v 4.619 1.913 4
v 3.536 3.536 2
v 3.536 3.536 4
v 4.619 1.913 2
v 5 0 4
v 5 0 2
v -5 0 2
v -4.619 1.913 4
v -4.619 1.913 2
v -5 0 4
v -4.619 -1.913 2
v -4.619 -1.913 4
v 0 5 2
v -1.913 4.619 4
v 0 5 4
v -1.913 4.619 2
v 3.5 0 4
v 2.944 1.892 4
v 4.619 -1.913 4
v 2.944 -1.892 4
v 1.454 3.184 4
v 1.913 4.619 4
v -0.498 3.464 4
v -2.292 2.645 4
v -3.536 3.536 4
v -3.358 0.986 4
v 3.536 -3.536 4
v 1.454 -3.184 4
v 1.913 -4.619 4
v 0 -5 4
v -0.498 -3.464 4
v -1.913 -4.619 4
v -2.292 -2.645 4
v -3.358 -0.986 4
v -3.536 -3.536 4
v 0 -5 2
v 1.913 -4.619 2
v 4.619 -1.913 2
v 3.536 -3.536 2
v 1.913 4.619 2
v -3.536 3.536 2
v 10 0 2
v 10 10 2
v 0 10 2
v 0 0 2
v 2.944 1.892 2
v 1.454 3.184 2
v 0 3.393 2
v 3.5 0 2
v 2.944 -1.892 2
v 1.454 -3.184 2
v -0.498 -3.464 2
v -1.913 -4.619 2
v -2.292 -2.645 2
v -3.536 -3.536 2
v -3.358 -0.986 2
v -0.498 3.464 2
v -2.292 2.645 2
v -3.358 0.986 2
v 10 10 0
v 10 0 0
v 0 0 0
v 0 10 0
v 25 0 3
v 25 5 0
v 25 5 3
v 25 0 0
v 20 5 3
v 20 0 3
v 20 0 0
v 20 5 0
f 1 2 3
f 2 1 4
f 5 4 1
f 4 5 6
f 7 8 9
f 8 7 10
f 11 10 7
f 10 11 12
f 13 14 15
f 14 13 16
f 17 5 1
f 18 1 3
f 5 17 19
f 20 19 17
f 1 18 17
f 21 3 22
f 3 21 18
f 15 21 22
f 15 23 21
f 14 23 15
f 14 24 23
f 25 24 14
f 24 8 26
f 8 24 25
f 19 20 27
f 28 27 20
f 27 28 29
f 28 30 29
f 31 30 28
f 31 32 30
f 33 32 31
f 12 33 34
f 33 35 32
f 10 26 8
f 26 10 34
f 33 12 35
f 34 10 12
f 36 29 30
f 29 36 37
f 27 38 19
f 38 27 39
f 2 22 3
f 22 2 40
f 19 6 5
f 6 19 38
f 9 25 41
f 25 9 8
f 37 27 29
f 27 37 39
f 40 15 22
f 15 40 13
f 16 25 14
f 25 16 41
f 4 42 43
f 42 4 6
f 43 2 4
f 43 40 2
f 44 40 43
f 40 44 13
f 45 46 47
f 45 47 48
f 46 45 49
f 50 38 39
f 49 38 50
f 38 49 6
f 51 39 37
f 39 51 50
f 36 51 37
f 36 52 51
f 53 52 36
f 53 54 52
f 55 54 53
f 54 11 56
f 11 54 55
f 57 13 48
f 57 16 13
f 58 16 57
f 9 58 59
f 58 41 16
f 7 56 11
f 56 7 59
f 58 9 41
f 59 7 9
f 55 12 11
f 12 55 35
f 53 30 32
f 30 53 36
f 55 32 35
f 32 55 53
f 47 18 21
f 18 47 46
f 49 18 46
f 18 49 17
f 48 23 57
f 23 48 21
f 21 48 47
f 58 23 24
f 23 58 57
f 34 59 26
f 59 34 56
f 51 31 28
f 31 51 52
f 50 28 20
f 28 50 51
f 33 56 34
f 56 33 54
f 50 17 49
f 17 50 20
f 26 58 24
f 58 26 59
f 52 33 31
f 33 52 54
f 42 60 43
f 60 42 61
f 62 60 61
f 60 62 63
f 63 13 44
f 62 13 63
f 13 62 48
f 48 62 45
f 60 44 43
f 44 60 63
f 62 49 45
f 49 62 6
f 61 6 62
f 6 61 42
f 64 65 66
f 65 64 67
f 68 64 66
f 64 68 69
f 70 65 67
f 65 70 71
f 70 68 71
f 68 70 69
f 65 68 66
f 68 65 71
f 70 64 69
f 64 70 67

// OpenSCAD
// file: used.scad
// used: definitions only, namespaced on import; half() and GAP are private to this file's context.
GAP = 3;
function half(x) = x / 2;
module scaled_block(s) { cube([half(s), half(s), GAP]); }
// file: inc.scad
// included: shares scope with the root; tube() reads the private constant FUDGE.
FUDGE = 1;
module tube(d, w) {
    difference() {
        cylinder(h = w, d = d);
        cylinder(h = w, d = d - w - FUDGE);
    }
}
// main file
// T-001 — hardening differential fixture.
// Minifying or obfuscating this bundle must render byte-identical CSG, emit identical ECHO, and add
// no new warnings (exercises: prologue params incl. a string, an echo'd string, an included private
// constant, a namespaced `use` library, an unused/tree-shakeable module).
wall = 2;          // [1:5]
size = 10;
part_name = "widget";
include <inc.scad>
use <used.scad>

module box(d) { cube([d, d, wall]); }
module unused_helper(n) { sphere(r = n); }   // never called -> tree-shaken away

echo("name:", part_name);
box(size);
translate([0, 0, wall]) tube(size, wall);
translate([size * 2, 0, 0]) scaled_block(size);
